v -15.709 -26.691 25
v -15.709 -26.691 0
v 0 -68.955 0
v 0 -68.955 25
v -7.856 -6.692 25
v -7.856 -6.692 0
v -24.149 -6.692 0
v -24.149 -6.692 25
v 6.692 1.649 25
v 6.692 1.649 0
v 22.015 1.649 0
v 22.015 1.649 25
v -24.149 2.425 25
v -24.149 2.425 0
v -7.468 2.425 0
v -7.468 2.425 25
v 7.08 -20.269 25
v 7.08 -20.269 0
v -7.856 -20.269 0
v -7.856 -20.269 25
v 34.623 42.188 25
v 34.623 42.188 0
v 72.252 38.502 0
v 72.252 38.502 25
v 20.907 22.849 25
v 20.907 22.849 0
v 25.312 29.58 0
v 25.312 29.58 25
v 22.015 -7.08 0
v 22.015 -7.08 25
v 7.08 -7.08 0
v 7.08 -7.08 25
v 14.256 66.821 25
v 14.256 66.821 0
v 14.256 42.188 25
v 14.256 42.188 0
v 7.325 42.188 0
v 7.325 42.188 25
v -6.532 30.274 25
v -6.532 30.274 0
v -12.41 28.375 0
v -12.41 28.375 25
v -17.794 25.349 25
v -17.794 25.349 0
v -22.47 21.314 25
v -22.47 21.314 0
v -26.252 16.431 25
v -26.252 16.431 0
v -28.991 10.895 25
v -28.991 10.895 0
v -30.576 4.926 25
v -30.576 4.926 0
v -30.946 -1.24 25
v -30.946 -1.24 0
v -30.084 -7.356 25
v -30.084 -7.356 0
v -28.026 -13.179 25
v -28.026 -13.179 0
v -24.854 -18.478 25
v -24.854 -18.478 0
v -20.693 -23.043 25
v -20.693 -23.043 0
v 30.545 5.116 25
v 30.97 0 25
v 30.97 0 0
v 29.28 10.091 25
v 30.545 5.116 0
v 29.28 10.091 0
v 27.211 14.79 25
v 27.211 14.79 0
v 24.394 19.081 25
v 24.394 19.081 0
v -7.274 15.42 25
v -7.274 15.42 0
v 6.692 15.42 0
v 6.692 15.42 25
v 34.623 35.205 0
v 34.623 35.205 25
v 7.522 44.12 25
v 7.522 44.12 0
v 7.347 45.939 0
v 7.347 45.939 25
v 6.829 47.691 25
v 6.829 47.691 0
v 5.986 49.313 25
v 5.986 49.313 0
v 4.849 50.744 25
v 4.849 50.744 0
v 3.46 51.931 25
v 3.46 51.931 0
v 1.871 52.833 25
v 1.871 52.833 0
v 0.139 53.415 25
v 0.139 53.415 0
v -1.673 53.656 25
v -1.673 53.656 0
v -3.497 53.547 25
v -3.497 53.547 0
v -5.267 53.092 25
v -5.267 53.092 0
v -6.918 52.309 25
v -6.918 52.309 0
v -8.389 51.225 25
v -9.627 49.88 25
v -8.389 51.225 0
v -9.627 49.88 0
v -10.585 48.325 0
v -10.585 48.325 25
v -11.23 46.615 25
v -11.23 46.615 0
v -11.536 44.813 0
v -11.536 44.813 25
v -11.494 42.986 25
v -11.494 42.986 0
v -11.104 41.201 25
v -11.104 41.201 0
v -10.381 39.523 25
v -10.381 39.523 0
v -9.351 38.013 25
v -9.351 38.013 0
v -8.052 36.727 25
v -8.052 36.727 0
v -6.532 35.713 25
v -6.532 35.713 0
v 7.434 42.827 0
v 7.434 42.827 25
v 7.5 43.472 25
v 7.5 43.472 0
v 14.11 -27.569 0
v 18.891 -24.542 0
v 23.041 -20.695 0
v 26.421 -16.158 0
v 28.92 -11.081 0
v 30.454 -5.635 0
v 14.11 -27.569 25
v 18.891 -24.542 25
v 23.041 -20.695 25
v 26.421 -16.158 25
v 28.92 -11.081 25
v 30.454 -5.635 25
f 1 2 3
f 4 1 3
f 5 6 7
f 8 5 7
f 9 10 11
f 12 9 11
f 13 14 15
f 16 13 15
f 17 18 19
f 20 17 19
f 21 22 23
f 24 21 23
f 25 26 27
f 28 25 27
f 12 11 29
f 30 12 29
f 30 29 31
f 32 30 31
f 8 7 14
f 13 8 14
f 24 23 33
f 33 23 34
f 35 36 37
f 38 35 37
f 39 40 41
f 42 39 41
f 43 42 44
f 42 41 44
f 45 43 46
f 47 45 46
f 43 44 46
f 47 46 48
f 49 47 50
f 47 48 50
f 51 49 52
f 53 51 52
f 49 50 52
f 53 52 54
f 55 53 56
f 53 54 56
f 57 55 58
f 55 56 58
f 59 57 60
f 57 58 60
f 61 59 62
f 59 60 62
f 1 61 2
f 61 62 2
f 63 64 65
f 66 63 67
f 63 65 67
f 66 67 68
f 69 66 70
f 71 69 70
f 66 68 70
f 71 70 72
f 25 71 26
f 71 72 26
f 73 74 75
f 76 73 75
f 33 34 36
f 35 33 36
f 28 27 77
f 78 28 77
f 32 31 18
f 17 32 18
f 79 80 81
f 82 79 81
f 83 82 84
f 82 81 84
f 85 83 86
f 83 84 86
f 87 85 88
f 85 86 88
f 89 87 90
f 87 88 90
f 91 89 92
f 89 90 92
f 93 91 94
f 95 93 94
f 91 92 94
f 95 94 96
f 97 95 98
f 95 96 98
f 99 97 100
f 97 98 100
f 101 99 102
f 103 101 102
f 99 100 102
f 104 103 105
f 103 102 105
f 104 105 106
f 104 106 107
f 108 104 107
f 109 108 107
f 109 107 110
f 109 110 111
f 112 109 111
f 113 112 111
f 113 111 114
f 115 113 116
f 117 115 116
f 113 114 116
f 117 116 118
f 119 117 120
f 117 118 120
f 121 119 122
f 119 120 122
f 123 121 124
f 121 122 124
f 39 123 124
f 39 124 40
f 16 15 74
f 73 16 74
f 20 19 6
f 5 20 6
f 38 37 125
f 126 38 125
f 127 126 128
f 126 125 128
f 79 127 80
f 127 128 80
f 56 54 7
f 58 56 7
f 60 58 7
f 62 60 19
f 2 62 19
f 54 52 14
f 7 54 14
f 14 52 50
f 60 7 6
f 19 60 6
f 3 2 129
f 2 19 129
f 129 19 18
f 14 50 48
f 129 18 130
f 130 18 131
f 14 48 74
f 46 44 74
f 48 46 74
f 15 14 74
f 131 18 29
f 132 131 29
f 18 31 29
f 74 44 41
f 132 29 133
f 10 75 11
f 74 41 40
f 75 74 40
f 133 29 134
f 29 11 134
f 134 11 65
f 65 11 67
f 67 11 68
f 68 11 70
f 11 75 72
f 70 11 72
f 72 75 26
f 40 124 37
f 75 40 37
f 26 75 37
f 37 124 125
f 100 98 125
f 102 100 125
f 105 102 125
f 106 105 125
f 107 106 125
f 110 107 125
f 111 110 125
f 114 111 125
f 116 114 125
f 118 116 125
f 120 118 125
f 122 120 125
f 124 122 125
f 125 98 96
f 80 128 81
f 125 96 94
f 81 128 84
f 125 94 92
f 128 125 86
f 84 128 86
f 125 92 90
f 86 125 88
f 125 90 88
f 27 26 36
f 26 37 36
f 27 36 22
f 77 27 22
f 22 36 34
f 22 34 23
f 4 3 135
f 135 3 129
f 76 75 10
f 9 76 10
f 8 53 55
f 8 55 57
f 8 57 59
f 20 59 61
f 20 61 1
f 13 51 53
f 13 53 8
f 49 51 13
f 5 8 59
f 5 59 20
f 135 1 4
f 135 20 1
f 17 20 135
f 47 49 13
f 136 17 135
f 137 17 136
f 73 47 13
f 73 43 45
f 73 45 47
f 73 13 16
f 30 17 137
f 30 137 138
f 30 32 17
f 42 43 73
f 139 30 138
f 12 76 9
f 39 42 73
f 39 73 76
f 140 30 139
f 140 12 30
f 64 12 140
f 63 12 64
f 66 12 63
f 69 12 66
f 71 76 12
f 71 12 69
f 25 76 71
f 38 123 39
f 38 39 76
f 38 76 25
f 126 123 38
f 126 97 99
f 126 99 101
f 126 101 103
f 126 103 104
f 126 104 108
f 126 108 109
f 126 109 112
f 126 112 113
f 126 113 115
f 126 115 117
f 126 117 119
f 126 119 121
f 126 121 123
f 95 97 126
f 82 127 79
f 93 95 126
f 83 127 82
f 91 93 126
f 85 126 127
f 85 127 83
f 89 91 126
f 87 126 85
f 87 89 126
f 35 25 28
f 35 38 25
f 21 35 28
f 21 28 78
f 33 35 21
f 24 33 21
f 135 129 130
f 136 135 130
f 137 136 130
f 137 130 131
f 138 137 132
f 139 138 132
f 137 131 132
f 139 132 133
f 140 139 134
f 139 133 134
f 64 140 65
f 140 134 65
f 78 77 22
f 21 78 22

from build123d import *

# Parameters (mm, degrees)
F1_DEPTH = 25


with BuildPart() as f1:
    # F0 (on Top) → F1 (new body)
    with BuildSketch(Plane.XY):
        with BuildLine():
            ThreePointArc((20.906867, 22.848913), (13.575228, 27.836723), (5.130714, 30.542523))
            ThreePointArc((5.130714, 30.542523), (-0.713577, 30.962247), (-6.532326, 30.273729))
            ThreePointArc((-6.532326, 30.273729), (-30.576246, 4.925761), (-15.709158, -26.690678))
            ThreePointArc((-15.709158, -26.690678), (-0.912134, -30.957034), (14.110414, -27.569297))
            ThreePointArc((14.110414, -27.569297), (26.421356, -16.158029), (30.970469, 0))
            ThreePointArc((30.970469, 0), (28.343125, 12.483478), (20.906867, 22.848913))
        make_face()
        Polygon((-7.467673, 2.424569), (-7.273707, 15.420259), (6.69181, 15.420259), (6.69181, 1.648707), (22.015087, 1.648707), (22.015087, -7.079741), (7.079741, -7.079741), (7.079741, -20.269398), (-7.855604, -20.269398), (-7.855604, -6.691811), (-24.148708, -6.691811), (-24.148708, 2.424569), align=None, mode=Mode.SUBTRACT)
        with BuildLine():
            ThreePointArc((-6.532326, 35.712912), (-0.337296, 34.727729), (5.130714, 37.801791))
            ThreePointArc((5.130714, 37.801791), (6.5142, 39.851303), (7.324579, 42.187501))
            ThreePointArc((7.324579, 42.187501), (7.472775, 43.148763), (7.522346, 44.120117))
            ThreePointArc((7.522346, 44.120117), (-6.917762, 52.308751), (-6.532326, 35.712912))
        make_face()
        with BuildLine():
            ThreePointArc((-6.532326, 30.273729), (-0.713577, 30.962247), (5.130714, 30.542523))
            Line((5.130714, 30.542523), (5.130714, 37.801791))
            ThreePointArc((5.130714, 37.801791), (-0.337296, 34.727729), (-6.532326, 35.712912))
            Line((-6.532326, 35.712912), (-6.532326, 30.273729))
        make_face()
        with BuildLine():
            ThreePointArc((14.110414, -27.569297), (-0.912134, -30.957034), (-15.709158, -26.690678))
            Line((-15.709158, -26.690678), (0, -68.954743))
            Line((0, -68.954743), (14.110414, -27.569297))
        make_face()
        with BuildLine():
            Line((5.130714, 37.801791), (5.130714, 30.542523))
            ThreePointArc((5.130714, 30.542523), (13.575228, 27.836723), (20.906867, 22.848913))
            Line((20.906867, 22.848913), (25.3125, 29.579744))
            Line((25.3125, 29.579744), (34.622848, 35.204742))
            Line((34.622848, 35.204742), (34.622848, 42.187501))
            Line((34.622848, 42.187501), (72.252154, 38.502157))
            Line((72.252154, 38.502157), (14.256467, 66.821128))
            Line((14.256467, 66.821128), (14.256467, 42.187501))
            Line((14.256467, 42.187501), (7.324579, 42.187501))
            ThreePointArc((7.324579, 42.187501), (6.5142, 39.851303), (5.130714, 37.801791))
        make_face()
    extrude(amount=F1_DEPTH)


solid = f1.part
